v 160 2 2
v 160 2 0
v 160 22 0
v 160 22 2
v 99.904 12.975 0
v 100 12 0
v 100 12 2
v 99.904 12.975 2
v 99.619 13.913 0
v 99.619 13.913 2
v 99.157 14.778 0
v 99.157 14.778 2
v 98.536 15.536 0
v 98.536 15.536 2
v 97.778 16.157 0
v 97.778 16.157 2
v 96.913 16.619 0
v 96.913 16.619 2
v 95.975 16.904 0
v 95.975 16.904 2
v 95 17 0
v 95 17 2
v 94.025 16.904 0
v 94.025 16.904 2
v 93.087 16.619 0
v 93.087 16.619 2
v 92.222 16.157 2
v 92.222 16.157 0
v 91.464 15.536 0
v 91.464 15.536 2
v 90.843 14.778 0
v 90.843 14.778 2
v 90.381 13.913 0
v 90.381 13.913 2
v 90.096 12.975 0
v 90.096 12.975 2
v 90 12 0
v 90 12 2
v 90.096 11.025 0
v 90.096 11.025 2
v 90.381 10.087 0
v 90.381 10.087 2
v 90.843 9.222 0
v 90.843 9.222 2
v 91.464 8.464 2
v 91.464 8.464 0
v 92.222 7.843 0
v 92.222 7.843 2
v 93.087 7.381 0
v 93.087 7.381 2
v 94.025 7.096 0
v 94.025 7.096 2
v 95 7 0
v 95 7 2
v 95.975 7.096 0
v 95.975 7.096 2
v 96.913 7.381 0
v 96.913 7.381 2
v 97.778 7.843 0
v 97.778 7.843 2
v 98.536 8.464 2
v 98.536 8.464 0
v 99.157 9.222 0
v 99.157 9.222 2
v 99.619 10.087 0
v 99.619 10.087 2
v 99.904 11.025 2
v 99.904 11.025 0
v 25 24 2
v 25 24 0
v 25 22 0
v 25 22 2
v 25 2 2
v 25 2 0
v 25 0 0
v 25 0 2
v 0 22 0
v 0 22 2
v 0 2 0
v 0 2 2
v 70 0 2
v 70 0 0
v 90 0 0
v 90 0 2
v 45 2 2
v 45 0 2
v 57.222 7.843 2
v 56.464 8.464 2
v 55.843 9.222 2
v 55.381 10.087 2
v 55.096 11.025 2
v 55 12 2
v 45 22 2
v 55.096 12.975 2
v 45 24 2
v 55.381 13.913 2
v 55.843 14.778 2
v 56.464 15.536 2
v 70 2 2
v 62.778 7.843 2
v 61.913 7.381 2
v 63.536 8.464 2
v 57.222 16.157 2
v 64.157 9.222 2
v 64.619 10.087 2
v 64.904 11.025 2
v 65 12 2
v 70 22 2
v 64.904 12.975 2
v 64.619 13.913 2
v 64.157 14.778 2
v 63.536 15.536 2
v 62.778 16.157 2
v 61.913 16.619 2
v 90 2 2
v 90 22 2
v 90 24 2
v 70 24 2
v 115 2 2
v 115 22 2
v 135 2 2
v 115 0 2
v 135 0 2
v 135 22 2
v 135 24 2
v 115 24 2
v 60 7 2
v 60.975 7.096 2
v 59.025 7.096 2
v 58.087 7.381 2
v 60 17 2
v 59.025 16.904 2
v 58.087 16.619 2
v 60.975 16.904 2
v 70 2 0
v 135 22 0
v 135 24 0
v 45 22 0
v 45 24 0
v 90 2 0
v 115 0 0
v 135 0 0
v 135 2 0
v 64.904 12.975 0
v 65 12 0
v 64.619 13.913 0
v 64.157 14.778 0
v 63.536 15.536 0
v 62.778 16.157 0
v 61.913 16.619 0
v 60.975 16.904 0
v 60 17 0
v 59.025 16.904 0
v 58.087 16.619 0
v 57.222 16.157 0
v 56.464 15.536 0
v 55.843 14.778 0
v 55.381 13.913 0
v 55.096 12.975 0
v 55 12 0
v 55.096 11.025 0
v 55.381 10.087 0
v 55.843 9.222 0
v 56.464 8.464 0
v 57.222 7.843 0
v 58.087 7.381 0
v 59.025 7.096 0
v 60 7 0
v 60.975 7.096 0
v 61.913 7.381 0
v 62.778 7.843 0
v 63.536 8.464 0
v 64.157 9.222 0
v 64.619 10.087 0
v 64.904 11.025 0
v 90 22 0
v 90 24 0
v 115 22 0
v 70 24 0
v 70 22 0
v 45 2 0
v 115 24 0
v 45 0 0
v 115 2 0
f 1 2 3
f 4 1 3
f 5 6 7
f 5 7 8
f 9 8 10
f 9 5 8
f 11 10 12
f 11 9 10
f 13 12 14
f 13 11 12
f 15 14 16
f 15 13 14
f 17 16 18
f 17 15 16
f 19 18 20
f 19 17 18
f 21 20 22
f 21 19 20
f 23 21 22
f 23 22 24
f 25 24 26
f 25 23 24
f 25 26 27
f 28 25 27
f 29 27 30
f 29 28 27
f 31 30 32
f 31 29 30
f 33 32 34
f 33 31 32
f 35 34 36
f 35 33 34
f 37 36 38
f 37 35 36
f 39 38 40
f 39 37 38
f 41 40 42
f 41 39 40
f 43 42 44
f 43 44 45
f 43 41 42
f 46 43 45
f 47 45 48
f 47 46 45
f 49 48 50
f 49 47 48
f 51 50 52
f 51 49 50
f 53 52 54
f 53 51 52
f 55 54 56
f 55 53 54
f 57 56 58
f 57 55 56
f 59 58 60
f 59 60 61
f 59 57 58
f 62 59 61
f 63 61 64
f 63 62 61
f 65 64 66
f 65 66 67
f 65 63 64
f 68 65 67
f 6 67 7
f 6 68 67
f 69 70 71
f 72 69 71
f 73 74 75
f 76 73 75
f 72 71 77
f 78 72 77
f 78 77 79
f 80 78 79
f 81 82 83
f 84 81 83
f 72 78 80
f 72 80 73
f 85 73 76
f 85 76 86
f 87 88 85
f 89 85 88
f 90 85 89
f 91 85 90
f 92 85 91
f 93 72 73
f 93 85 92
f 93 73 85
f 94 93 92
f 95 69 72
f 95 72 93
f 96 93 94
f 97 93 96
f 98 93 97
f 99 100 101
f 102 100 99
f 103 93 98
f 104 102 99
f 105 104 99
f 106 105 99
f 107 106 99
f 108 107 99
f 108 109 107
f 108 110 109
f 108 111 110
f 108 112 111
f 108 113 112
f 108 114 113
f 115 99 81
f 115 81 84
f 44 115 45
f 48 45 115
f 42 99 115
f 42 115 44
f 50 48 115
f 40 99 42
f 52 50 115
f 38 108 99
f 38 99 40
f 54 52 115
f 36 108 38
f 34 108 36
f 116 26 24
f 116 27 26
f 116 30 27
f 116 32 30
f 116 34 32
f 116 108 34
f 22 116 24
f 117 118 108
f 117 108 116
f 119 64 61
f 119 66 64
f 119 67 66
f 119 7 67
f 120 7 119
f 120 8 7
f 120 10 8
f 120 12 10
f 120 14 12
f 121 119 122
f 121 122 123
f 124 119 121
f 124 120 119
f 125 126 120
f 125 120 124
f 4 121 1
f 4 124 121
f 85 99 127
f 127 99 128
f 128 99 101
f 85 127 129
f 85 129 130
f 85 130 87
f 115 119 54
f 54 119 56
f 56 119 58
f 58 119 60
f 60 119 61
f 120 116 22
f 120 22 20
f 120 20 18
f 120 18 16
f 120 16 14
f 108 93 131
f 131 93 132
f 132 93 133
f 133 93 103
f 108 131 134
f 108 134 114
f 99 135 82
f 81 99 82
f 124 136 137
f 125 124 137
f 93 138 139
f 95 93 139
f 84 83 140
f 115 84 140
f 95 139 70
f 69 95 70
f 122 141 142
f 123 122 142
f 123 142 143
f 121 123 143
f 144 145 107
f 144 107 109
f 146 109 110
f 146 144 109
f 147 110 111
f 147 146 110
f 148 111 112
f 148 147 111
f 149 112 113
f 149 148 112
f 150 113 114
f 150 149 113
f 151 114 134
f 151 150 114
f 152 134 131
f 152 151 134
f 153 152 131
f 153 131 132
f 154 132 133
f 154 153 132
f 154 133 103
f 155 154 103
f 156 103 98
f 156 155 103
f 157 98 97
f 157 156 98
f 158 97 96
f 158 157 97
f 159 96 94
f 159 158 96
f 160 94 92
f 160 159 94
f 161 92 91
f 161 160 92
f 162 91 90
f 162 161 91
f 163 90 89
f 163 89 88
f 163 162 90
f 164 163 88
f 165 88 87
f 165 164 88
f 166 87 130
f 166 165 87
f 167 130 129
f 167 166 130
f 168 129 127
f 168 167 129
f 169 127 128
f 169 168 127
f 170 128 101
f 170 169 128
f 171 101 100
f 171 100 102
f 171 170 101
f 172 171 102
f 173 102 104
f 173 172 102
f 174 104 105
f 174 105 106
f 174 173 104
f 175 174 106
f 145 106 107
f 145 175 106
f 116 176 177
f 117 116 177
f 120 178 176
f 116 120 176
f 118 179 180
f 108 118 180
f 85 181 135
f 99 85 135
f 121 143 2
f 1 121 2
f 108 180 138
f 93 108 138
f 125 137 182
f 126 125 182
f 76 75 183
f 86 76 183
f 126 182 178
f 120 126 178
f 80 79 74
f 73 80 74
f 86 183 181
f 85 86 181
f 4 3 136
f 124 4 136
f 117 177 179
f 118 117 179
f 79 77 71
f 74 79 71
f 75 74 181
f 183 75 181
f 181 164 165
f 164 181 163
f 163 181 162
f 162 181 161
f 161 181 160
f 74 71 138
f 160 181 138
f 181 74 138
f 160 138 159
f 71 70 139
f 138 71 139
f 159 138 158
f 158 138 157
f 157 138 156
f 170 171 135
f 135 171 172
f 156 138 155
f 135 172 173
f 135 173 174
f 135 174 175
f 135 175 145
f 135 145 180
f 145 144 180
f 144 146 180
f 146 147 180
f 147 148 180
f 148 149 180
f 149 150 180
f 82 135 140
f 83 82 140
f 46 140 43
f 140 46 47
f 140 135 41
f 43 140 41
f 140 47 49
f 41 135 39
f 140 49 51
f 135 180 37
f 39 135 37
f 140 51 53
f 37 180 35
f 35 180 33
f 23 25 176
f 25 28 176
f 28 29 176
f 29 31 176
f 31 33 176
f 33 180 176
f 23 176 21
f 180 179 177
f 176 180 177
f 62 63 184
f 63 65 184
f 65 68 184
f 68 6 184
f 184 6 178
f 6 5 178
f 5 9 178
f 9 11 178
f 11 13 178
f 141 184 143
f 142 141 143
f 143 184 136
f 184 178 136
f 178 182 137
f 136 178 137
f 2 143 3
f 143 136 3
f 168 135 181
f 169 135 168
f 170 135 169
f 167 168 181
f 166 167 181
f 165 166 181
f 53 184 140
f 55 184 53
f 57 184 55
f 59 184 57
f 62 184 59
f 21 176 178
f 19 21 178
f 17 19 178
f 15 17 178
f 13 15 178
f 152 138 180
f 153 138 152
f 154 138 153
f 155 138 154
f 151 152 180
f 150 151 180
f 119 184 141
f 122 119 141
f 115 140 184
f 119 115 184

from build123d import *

# Parameters (mm, degrees)
SKETCH_1_R      = 5
EXTRUDE_1_DEPTH = 2


with BuildPart() as part:
    # Эскиз1 → Бобышка-Вытянуть1 (new body)
    with BuildSketch(Plane.XY):
        Polygon((25, 2), (25, 0), (45, 0), (45, 2), (70, 2), (70, 0), (90, 0), (90, 2), (115, 2), (115, 0), (135, 0), (135, 2), (160, 2), (160, 22), (135, 22), (135, 24), (115, 24), (115, 22), (90, 22), (90, 24), (70, 24), (70, 22), (45, 22), (45, 24), (25, 24), (25, 22), (0, 22), (0, 2), align=None)
        with Locations((60, 12)):
            Circle(SKETCH_1_R, mode=Mode.SUBTRACT)
        with Locations((95, 12)):
            Circle(SKETCH_1_R, mode=Mode.SUBTRACT)
    extrude(amount=EXTRUDE_1_DEPTH)


solid = part.part
